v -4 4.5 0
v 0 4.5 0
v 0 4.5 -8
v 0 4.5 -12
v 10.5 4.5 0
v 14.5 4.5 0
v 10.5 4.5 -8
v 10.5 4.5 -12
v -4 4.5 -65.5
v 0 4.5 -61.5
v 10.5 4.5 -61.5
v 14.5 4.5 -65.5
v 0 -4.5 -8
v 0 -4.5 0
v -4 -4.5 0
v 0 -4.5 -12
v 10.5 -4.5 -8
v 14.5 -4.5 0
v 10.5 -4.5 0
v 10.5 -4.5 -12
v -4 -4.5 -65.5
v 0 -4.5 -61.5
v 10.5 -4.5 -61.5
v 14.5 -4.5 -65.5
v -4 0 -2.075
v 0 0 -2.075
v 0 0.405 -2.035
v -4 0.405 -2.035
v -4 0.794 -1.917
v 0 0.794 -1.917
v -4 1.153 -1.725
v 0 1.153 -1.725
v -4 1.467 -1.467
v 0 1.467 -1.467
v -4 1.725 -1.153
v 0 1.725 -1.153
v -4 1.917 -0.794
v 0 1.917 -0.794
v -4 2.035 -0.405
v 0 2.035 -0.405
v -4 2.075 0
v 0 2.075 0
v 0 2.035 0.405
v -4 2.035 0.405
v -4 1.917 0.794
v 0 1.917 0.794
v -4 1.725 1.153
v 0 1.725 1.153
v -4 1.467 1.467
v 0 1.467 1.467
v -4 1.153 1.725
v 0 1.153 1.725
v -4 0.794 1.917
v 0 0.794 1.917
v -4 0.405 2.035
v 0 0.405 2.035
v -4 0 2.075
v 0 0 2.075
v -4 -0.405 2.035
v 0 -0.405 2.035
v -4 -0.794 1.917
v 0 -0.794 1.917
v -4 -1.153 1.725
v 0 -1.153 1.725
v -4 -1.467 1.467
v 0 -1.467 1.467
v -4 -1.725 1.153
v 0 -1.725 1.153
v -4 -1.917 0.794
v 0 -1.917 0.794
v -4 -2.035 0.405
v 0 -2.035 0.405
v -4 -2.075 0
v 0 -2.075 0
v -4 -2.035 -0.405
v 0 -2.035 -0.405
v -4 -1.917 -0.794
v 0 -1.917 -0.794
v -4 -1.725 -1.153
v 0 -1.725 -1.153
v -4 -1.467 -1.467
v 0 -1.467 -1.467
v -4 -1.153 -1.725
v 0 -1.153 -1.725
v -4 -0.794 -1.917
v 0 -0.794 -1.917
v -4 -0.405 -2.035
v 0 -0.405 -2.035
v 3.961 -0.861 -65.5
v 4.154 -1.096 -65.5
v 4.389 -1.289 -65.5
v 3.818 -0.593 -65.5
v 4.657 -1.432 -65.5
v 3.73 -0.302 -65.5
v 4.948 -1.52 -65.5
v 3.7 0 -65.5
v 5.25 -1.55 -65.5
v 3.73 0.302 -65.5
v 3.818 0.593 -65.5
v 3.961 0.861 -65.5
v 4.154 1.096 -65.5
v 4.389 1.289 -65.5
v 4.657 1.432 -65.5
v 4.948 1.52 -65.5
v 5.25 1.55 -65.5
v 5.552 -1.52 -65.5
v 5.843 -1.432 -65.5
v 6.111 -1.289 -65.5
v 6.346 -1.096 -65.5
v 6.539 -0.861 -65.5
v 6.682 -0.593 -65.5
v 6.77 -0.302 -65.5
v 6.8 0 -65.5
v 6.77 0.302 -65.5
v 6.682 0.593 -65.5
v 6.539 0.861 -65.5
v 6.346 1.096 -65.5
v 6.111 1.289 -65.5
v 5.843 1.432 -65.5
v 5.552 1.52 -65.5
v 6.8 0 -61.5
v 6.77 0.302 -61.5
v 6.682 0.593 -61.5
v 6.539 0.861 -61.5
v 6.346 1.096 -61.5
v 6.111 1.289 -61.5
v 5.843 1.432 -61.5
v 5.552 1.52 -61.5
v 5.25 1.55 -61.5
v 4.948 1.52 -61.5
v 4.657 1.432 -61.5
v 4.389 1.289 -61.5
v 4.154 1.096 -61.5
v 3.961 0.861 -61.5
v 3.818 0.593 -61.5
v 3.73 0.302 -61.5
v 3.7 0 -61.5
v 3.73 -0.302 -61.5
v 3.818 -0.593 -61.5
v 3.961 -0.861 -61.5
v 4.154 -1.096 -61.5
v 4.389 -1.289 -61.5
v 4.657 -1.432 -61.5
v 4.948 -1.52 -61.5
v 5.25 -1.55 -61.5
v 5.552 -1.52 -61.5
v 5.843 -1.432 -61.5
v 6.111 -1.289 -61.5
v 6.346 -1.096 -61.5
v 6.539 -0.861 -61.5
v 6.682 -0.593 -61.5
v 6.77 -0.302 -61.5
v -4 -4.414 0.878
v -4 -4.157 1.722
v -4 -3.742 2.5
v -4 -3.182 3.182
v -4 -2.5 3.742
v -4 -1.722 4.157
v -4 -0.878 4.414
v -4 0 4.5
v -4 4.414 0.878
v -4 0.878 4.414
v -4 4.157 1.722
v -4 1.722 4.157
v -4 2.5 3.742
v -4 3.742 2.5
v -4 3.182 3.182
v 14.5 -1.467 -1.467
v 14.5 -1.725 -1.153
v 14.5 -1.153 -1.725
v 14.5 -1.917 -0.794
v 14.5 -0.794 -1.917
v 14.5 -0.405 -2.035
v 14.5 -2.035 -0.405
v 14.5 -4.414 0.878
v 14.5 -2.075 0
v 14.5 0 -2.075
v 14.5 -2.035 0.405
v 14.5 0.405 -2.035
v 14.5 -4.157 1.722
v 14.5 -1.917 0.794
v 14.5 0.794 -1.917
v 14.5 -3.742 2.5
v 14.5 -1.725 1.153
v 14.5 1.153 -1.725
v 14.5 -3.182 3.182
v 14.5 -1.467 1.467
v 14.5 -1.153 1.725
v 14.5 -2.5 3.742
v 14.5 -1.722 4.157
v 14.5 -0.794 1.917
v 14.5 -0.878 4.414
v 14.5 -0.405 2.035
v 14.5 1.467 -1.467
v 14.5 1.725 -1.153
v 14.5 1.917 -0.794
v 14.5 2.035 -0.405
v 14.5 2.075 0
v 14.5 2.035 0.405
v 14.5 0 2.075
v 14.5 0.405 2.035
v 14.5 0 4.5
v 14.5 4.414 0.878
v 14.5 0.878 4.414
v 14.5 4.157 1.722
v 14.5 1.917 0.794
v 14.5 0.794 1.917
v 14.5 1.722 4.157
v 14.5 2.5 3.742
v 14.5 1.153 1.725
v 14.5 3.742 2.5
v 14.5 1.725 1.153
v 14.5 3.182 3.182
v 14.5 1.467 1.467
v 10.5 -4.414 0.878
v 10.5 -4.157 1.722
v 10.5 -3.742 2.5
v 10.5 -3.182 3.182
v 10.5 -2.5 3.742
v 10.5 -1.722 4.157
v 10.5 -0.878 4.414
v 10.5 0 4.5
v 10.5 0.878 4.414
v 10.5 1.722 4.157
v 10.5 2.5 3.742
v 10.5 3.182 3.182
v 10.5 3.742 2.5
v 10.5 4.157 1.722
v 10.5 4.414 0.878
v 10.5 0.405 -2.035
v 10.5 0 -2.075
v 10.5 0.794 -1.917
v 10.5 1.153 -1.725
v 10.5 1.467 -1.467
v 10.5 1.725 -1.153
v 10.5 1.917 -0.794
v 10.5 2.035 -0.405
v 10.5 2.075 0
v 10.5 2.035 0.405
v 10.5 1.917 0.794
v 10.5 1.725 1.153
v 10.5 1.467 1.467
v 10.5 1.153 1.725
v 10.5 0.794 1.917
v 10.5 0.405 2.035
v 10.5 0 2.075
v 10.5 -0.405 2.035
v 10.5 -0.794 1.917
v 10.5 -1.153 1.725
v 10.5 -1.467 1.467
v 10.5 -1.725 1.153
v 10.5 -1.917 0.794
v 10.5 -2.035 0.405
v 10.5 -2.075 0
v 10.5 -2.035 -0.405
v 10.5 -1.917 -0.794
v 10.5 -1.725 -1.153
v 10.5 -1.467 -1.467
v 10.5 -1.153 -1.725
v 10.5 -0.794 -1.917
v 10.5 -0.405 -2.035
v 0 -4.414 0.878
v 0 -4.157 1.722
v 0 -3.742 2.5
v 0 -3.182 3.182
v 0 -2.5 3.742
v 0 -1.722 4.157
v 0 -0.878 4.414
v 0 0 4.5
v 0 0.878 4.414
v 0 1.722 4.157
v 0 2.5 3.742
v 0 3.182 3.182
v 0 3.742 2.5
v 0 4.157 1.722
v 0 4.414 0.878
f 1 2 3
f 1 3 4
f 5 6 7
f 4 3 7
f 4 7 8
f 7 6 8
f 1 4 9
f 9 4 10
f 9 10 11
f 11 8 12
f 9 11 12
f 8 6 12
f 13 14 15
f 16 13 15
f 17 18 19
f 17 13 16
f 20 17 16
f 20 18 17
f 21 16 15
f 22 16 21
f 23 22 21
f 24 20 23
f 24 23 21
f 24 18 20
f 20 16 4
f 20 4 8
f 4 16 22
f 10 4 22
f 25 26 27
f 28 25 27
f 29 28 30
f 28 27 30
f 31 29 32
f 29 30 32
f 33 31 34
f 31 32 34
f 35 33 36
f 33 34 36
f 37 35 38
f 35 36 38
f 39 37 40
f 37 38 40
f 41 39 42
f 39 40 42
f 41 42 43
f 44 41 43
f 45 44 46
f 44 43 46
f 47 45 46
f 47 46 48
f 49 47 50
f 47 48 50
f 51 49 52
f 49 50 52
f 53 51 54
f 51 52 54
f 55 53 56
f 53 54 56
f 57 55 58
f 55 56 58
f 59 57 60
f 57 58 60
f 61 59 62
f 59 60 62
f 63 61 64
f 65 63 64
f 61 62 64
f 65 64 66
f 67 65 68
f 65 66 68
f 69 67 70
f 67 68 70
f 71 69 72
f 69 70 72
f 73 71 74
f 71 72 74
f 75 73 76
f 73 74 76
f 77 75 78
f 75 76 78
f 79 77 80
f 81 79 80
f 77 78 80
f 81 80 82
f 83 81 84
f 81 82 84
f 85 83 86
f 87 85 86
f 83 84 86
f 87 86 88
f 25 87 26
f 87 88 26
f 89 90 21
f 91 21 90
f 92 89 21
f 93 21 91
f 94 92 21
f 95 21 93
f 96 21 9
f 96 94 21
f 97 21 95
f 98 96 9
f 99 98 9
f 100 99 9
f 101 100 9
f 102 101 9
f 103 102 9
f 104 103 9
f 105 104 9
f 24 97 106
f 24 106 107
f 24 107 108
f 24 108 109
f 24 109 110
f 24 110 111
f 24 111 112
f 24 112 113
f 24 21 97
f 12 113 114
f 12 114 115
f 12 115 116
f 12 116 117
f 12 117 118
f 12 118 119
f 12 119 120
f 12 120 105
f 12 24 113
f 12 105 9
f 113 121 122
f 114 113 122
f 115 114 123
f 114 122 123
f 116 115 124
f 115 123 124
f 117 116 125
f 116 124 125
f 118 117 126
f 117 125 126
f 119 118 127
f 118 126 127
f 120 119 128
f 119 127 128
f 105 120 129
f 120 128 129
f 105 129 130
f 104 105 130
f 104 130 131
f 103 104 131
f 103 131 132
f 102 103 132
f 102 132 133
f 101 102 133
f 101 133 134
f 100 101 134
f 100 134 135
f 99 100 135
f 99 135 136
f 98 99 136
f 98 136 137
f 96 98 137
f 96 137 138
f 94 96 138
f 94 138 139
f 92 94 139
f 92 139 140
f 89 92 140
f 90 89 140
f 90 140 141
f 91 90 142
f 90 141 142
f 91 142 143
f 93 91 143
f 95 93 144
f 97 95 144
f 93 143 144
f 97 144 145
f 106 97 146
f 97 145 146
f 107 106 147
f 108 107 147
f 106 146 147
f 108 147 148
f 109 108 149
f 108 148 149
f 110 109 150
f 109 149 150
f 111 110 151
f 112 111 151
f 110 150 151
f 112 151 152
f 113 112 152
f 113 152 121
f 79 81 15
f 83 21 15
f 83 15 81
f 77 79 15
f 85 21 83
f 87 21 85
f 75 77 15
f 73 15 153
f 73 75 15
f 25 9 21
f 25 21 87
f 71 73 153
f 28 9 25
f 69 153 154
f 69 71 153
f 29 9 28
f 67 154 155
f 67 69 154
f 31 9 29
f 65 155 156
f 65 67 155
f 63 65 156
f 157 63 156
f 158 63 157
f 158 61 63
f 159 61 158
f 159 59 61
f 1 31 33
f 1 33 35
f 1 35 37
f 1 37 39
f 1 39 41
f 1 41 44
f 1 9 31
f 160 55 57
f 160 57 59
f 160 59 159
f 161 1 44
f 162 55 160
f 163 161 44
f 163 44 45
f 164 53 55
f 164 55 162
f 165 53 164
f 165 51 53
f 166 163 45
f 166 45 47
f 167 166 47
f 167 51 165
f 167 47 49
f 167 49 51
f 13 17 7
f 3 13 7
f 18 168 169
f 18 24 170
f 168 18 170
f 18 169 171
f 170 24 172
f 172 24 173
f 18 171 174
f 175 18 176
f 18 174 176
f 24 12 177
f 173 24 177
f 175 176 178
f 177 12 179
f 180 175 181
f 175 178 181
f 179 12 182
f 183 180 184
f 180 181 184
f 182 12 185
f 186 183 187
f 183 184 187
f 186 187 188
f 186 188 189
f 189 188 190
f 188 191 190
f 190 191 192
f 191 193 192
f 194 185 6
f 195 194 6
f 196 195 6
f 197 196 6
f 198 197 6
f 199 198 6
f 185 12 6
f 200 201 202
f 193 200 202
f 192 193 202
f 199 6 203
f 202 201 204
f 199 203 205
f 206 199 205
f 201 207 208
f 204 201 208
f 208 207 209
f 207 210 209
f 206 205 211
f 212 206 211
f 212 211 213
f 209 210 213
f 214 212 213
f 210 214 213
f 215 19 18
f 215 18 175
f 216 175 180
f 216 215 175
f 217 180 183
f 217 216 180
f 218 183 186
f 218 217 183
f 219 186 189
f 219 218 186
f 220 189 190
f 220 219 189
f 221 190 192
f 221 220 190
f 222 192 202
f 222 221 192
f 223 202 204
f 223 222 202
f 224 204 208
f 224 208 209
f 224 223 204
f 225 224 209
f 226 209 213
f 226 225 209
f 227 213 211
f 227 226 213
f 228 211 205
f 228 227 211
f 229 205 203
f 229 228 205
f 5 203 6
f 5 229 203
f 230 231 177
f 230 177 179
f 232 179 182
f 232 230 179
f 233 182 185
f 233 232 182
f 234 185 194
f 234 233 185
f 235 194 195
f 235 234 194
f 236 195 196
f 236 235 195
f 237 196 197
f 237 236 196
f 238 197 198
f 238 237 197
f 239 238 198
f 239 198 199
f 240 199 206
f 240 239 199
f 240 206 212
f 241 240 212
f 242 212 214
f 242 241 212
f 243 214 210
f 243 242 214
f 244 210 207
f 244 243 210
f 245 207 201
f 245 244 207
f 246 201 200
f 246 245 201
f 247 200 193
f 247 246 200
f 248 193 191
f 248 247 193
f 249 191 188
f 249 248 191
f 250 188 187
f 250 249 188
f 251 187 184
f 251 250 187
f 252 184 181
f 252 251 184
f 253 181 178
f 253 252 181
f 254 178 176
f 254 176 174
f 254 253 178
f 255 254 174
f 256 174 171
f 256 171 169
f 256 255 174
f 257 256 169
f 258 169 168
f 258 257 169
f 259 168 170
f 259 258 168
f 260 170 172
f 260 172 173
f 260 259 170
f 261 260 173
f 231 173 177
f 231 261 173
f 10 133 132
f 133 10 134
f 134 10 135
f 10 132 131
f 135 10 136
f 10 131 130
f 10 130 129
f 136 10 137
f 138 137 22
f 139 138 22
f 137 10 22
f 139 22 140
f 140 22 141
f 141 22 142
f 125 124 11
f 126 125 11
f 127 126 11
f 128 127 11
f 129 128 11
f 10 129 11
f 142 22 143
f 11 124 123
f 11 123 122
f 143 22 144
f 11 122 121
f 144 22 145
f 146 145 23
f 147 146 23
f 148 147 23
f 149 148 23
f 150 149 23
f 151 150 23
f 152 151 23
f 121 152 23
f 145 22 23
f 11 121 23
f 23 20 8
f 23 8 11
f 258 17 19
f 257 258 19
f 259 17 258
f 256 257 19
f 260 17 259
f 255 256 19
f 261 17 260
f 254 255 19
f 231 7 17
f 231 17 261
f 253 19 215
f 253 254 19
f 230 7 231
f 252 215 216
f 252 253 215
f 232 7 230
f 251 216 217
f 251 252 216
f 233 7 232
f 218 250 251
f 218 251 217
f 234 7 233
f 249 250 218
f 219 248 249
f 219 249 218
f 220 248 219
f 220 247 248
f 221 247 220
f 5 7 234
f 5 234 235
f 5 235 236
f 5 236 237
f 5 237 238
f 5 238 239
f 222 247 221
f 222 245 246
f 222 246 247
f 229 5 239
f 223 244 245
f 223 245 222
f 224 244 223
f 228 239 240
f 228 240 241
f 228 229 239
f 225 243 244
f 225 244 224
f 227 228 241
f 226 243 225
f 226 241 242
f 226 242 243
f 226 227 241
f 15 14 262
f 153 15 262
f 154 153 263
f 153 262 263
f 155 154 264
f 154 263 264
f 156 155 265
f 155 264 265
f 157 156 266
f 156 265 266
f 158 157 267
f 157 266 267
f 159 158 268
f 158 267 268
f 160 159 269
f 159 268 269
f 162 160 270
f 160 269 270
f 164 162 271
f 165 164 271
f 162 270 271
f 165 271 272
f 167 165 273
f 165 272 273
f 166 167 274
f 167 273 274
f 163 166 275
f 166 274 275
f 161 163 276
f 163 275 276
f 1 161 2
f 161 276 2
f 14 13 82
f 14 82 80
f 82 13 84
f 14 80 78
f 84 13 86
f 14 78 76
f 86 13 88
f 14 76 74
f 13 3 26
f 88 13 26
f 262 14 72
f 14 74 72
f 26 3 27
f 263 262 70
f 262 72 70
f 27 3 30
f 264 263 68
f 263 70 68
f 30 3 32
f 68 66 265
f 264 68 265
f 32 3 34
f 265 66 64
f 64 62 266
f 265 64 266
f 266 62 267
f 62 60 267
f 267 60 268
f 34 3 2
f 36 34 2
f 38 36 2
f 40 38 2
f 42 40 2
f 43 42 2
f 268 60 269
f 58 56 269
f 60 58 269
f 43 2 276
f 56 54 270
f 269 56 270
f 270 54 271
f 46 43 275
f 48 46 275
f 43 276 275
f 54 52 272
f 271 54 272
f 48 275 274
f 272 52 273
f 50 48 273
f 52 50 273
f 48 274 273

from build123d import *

# Parameters (mm, degrees)
SKETCH1_R               = 2.075
BOSS_EXTRUDE1_DEPTH     = 4
SKETCH2_W               = 57.5
SKETCH2_H               = 9
BOSS_EXTRUDE2_DEPTH     = 5.25
CUT_EXTRUDE1_DEPTH      = 11
CUT_EXTRUDE1_DEPTH_BACK = 11
SKETCH3_W               = 10.5
SKETCH3_H               = 49.5
SKETCH4_R               = 1.55
CUT_EXTRUDE2_DEPTH      = 11


with BuildPart() as part:
    # Sketch1 → Boss-Extrude1 (new body)
    with BuildSketch(Plane(origin=(0, 0, 0), x_dir=(0, 0, -1), z_dir=(1, 0, 0))):
        with BuildLine():
            Line((0, 4.5), (65.5, 4.5))
            Line((65.5, 4.5), (65.5, -4.5))
            Line((65.5, -4.5), (0, -4.5))
            ThreePointArc((0, -4.5), (-4.5, 0), (0, 4.5))
        make_face()
        Circle(SKETCH1_R, mode=Mode.SUBTRACT)
    extrude(amount=-BOSS_EXTRUDE1_DEPTH)

    # Sketch2 → Boss-Extrude2 (add)
    with BuildSketch(Plane(origin=(0, 0, 0), x_dir=(0, 0, -1), z_dir=(1, 0, 0))):
        with Locations((36.75, 0)):
            Rectangle(SKETCH2_W, SKETCH2_H)
    extrude(amount=BOSS_EXTRUDE2_DEPTH)

    # Mirror2: part across plane


with BuildPart() as part_1:
    add(part.part)
    add(part.part.mirror(Plane(origin=(5.25, 0, 0), x_dir=(0, 0, 1), z_dir=(1, 0, 0))))

    # Sketch3 → Cut-Extrude1 (cut, two sides: drawn at the far end of the back side and taken through both)
    with BuildSketch(Plane(origin=(0, 0, 0), x_dir=(1, 0, 0), z_dir=(0, 1, 0)).offset(-CUT_EXTRUDE1_DEPTH_BACK)):
        with Locations((5.25, 36.75)):
            Rectangle(SKETCH3_W, SKETCH3_H)
    extrude(amount=CUT_EXTRUDE1_DEPTH + CUT_EXTRUDE1_DEPTH_BACK, mode=Mode.SUBTRACT)

    # Sketch4 → Cut-Extrude2 (cut)
    with BuildSketch(Plane.XY.offset(-60)):
        with Locations((5.25, 0)):
            Circle(SKETCH4_R)
    extrude(amount=-CUT_EXTRUDE2_DEPTH, mode=Mode.SUBTRACT)


solid = part_1.part
